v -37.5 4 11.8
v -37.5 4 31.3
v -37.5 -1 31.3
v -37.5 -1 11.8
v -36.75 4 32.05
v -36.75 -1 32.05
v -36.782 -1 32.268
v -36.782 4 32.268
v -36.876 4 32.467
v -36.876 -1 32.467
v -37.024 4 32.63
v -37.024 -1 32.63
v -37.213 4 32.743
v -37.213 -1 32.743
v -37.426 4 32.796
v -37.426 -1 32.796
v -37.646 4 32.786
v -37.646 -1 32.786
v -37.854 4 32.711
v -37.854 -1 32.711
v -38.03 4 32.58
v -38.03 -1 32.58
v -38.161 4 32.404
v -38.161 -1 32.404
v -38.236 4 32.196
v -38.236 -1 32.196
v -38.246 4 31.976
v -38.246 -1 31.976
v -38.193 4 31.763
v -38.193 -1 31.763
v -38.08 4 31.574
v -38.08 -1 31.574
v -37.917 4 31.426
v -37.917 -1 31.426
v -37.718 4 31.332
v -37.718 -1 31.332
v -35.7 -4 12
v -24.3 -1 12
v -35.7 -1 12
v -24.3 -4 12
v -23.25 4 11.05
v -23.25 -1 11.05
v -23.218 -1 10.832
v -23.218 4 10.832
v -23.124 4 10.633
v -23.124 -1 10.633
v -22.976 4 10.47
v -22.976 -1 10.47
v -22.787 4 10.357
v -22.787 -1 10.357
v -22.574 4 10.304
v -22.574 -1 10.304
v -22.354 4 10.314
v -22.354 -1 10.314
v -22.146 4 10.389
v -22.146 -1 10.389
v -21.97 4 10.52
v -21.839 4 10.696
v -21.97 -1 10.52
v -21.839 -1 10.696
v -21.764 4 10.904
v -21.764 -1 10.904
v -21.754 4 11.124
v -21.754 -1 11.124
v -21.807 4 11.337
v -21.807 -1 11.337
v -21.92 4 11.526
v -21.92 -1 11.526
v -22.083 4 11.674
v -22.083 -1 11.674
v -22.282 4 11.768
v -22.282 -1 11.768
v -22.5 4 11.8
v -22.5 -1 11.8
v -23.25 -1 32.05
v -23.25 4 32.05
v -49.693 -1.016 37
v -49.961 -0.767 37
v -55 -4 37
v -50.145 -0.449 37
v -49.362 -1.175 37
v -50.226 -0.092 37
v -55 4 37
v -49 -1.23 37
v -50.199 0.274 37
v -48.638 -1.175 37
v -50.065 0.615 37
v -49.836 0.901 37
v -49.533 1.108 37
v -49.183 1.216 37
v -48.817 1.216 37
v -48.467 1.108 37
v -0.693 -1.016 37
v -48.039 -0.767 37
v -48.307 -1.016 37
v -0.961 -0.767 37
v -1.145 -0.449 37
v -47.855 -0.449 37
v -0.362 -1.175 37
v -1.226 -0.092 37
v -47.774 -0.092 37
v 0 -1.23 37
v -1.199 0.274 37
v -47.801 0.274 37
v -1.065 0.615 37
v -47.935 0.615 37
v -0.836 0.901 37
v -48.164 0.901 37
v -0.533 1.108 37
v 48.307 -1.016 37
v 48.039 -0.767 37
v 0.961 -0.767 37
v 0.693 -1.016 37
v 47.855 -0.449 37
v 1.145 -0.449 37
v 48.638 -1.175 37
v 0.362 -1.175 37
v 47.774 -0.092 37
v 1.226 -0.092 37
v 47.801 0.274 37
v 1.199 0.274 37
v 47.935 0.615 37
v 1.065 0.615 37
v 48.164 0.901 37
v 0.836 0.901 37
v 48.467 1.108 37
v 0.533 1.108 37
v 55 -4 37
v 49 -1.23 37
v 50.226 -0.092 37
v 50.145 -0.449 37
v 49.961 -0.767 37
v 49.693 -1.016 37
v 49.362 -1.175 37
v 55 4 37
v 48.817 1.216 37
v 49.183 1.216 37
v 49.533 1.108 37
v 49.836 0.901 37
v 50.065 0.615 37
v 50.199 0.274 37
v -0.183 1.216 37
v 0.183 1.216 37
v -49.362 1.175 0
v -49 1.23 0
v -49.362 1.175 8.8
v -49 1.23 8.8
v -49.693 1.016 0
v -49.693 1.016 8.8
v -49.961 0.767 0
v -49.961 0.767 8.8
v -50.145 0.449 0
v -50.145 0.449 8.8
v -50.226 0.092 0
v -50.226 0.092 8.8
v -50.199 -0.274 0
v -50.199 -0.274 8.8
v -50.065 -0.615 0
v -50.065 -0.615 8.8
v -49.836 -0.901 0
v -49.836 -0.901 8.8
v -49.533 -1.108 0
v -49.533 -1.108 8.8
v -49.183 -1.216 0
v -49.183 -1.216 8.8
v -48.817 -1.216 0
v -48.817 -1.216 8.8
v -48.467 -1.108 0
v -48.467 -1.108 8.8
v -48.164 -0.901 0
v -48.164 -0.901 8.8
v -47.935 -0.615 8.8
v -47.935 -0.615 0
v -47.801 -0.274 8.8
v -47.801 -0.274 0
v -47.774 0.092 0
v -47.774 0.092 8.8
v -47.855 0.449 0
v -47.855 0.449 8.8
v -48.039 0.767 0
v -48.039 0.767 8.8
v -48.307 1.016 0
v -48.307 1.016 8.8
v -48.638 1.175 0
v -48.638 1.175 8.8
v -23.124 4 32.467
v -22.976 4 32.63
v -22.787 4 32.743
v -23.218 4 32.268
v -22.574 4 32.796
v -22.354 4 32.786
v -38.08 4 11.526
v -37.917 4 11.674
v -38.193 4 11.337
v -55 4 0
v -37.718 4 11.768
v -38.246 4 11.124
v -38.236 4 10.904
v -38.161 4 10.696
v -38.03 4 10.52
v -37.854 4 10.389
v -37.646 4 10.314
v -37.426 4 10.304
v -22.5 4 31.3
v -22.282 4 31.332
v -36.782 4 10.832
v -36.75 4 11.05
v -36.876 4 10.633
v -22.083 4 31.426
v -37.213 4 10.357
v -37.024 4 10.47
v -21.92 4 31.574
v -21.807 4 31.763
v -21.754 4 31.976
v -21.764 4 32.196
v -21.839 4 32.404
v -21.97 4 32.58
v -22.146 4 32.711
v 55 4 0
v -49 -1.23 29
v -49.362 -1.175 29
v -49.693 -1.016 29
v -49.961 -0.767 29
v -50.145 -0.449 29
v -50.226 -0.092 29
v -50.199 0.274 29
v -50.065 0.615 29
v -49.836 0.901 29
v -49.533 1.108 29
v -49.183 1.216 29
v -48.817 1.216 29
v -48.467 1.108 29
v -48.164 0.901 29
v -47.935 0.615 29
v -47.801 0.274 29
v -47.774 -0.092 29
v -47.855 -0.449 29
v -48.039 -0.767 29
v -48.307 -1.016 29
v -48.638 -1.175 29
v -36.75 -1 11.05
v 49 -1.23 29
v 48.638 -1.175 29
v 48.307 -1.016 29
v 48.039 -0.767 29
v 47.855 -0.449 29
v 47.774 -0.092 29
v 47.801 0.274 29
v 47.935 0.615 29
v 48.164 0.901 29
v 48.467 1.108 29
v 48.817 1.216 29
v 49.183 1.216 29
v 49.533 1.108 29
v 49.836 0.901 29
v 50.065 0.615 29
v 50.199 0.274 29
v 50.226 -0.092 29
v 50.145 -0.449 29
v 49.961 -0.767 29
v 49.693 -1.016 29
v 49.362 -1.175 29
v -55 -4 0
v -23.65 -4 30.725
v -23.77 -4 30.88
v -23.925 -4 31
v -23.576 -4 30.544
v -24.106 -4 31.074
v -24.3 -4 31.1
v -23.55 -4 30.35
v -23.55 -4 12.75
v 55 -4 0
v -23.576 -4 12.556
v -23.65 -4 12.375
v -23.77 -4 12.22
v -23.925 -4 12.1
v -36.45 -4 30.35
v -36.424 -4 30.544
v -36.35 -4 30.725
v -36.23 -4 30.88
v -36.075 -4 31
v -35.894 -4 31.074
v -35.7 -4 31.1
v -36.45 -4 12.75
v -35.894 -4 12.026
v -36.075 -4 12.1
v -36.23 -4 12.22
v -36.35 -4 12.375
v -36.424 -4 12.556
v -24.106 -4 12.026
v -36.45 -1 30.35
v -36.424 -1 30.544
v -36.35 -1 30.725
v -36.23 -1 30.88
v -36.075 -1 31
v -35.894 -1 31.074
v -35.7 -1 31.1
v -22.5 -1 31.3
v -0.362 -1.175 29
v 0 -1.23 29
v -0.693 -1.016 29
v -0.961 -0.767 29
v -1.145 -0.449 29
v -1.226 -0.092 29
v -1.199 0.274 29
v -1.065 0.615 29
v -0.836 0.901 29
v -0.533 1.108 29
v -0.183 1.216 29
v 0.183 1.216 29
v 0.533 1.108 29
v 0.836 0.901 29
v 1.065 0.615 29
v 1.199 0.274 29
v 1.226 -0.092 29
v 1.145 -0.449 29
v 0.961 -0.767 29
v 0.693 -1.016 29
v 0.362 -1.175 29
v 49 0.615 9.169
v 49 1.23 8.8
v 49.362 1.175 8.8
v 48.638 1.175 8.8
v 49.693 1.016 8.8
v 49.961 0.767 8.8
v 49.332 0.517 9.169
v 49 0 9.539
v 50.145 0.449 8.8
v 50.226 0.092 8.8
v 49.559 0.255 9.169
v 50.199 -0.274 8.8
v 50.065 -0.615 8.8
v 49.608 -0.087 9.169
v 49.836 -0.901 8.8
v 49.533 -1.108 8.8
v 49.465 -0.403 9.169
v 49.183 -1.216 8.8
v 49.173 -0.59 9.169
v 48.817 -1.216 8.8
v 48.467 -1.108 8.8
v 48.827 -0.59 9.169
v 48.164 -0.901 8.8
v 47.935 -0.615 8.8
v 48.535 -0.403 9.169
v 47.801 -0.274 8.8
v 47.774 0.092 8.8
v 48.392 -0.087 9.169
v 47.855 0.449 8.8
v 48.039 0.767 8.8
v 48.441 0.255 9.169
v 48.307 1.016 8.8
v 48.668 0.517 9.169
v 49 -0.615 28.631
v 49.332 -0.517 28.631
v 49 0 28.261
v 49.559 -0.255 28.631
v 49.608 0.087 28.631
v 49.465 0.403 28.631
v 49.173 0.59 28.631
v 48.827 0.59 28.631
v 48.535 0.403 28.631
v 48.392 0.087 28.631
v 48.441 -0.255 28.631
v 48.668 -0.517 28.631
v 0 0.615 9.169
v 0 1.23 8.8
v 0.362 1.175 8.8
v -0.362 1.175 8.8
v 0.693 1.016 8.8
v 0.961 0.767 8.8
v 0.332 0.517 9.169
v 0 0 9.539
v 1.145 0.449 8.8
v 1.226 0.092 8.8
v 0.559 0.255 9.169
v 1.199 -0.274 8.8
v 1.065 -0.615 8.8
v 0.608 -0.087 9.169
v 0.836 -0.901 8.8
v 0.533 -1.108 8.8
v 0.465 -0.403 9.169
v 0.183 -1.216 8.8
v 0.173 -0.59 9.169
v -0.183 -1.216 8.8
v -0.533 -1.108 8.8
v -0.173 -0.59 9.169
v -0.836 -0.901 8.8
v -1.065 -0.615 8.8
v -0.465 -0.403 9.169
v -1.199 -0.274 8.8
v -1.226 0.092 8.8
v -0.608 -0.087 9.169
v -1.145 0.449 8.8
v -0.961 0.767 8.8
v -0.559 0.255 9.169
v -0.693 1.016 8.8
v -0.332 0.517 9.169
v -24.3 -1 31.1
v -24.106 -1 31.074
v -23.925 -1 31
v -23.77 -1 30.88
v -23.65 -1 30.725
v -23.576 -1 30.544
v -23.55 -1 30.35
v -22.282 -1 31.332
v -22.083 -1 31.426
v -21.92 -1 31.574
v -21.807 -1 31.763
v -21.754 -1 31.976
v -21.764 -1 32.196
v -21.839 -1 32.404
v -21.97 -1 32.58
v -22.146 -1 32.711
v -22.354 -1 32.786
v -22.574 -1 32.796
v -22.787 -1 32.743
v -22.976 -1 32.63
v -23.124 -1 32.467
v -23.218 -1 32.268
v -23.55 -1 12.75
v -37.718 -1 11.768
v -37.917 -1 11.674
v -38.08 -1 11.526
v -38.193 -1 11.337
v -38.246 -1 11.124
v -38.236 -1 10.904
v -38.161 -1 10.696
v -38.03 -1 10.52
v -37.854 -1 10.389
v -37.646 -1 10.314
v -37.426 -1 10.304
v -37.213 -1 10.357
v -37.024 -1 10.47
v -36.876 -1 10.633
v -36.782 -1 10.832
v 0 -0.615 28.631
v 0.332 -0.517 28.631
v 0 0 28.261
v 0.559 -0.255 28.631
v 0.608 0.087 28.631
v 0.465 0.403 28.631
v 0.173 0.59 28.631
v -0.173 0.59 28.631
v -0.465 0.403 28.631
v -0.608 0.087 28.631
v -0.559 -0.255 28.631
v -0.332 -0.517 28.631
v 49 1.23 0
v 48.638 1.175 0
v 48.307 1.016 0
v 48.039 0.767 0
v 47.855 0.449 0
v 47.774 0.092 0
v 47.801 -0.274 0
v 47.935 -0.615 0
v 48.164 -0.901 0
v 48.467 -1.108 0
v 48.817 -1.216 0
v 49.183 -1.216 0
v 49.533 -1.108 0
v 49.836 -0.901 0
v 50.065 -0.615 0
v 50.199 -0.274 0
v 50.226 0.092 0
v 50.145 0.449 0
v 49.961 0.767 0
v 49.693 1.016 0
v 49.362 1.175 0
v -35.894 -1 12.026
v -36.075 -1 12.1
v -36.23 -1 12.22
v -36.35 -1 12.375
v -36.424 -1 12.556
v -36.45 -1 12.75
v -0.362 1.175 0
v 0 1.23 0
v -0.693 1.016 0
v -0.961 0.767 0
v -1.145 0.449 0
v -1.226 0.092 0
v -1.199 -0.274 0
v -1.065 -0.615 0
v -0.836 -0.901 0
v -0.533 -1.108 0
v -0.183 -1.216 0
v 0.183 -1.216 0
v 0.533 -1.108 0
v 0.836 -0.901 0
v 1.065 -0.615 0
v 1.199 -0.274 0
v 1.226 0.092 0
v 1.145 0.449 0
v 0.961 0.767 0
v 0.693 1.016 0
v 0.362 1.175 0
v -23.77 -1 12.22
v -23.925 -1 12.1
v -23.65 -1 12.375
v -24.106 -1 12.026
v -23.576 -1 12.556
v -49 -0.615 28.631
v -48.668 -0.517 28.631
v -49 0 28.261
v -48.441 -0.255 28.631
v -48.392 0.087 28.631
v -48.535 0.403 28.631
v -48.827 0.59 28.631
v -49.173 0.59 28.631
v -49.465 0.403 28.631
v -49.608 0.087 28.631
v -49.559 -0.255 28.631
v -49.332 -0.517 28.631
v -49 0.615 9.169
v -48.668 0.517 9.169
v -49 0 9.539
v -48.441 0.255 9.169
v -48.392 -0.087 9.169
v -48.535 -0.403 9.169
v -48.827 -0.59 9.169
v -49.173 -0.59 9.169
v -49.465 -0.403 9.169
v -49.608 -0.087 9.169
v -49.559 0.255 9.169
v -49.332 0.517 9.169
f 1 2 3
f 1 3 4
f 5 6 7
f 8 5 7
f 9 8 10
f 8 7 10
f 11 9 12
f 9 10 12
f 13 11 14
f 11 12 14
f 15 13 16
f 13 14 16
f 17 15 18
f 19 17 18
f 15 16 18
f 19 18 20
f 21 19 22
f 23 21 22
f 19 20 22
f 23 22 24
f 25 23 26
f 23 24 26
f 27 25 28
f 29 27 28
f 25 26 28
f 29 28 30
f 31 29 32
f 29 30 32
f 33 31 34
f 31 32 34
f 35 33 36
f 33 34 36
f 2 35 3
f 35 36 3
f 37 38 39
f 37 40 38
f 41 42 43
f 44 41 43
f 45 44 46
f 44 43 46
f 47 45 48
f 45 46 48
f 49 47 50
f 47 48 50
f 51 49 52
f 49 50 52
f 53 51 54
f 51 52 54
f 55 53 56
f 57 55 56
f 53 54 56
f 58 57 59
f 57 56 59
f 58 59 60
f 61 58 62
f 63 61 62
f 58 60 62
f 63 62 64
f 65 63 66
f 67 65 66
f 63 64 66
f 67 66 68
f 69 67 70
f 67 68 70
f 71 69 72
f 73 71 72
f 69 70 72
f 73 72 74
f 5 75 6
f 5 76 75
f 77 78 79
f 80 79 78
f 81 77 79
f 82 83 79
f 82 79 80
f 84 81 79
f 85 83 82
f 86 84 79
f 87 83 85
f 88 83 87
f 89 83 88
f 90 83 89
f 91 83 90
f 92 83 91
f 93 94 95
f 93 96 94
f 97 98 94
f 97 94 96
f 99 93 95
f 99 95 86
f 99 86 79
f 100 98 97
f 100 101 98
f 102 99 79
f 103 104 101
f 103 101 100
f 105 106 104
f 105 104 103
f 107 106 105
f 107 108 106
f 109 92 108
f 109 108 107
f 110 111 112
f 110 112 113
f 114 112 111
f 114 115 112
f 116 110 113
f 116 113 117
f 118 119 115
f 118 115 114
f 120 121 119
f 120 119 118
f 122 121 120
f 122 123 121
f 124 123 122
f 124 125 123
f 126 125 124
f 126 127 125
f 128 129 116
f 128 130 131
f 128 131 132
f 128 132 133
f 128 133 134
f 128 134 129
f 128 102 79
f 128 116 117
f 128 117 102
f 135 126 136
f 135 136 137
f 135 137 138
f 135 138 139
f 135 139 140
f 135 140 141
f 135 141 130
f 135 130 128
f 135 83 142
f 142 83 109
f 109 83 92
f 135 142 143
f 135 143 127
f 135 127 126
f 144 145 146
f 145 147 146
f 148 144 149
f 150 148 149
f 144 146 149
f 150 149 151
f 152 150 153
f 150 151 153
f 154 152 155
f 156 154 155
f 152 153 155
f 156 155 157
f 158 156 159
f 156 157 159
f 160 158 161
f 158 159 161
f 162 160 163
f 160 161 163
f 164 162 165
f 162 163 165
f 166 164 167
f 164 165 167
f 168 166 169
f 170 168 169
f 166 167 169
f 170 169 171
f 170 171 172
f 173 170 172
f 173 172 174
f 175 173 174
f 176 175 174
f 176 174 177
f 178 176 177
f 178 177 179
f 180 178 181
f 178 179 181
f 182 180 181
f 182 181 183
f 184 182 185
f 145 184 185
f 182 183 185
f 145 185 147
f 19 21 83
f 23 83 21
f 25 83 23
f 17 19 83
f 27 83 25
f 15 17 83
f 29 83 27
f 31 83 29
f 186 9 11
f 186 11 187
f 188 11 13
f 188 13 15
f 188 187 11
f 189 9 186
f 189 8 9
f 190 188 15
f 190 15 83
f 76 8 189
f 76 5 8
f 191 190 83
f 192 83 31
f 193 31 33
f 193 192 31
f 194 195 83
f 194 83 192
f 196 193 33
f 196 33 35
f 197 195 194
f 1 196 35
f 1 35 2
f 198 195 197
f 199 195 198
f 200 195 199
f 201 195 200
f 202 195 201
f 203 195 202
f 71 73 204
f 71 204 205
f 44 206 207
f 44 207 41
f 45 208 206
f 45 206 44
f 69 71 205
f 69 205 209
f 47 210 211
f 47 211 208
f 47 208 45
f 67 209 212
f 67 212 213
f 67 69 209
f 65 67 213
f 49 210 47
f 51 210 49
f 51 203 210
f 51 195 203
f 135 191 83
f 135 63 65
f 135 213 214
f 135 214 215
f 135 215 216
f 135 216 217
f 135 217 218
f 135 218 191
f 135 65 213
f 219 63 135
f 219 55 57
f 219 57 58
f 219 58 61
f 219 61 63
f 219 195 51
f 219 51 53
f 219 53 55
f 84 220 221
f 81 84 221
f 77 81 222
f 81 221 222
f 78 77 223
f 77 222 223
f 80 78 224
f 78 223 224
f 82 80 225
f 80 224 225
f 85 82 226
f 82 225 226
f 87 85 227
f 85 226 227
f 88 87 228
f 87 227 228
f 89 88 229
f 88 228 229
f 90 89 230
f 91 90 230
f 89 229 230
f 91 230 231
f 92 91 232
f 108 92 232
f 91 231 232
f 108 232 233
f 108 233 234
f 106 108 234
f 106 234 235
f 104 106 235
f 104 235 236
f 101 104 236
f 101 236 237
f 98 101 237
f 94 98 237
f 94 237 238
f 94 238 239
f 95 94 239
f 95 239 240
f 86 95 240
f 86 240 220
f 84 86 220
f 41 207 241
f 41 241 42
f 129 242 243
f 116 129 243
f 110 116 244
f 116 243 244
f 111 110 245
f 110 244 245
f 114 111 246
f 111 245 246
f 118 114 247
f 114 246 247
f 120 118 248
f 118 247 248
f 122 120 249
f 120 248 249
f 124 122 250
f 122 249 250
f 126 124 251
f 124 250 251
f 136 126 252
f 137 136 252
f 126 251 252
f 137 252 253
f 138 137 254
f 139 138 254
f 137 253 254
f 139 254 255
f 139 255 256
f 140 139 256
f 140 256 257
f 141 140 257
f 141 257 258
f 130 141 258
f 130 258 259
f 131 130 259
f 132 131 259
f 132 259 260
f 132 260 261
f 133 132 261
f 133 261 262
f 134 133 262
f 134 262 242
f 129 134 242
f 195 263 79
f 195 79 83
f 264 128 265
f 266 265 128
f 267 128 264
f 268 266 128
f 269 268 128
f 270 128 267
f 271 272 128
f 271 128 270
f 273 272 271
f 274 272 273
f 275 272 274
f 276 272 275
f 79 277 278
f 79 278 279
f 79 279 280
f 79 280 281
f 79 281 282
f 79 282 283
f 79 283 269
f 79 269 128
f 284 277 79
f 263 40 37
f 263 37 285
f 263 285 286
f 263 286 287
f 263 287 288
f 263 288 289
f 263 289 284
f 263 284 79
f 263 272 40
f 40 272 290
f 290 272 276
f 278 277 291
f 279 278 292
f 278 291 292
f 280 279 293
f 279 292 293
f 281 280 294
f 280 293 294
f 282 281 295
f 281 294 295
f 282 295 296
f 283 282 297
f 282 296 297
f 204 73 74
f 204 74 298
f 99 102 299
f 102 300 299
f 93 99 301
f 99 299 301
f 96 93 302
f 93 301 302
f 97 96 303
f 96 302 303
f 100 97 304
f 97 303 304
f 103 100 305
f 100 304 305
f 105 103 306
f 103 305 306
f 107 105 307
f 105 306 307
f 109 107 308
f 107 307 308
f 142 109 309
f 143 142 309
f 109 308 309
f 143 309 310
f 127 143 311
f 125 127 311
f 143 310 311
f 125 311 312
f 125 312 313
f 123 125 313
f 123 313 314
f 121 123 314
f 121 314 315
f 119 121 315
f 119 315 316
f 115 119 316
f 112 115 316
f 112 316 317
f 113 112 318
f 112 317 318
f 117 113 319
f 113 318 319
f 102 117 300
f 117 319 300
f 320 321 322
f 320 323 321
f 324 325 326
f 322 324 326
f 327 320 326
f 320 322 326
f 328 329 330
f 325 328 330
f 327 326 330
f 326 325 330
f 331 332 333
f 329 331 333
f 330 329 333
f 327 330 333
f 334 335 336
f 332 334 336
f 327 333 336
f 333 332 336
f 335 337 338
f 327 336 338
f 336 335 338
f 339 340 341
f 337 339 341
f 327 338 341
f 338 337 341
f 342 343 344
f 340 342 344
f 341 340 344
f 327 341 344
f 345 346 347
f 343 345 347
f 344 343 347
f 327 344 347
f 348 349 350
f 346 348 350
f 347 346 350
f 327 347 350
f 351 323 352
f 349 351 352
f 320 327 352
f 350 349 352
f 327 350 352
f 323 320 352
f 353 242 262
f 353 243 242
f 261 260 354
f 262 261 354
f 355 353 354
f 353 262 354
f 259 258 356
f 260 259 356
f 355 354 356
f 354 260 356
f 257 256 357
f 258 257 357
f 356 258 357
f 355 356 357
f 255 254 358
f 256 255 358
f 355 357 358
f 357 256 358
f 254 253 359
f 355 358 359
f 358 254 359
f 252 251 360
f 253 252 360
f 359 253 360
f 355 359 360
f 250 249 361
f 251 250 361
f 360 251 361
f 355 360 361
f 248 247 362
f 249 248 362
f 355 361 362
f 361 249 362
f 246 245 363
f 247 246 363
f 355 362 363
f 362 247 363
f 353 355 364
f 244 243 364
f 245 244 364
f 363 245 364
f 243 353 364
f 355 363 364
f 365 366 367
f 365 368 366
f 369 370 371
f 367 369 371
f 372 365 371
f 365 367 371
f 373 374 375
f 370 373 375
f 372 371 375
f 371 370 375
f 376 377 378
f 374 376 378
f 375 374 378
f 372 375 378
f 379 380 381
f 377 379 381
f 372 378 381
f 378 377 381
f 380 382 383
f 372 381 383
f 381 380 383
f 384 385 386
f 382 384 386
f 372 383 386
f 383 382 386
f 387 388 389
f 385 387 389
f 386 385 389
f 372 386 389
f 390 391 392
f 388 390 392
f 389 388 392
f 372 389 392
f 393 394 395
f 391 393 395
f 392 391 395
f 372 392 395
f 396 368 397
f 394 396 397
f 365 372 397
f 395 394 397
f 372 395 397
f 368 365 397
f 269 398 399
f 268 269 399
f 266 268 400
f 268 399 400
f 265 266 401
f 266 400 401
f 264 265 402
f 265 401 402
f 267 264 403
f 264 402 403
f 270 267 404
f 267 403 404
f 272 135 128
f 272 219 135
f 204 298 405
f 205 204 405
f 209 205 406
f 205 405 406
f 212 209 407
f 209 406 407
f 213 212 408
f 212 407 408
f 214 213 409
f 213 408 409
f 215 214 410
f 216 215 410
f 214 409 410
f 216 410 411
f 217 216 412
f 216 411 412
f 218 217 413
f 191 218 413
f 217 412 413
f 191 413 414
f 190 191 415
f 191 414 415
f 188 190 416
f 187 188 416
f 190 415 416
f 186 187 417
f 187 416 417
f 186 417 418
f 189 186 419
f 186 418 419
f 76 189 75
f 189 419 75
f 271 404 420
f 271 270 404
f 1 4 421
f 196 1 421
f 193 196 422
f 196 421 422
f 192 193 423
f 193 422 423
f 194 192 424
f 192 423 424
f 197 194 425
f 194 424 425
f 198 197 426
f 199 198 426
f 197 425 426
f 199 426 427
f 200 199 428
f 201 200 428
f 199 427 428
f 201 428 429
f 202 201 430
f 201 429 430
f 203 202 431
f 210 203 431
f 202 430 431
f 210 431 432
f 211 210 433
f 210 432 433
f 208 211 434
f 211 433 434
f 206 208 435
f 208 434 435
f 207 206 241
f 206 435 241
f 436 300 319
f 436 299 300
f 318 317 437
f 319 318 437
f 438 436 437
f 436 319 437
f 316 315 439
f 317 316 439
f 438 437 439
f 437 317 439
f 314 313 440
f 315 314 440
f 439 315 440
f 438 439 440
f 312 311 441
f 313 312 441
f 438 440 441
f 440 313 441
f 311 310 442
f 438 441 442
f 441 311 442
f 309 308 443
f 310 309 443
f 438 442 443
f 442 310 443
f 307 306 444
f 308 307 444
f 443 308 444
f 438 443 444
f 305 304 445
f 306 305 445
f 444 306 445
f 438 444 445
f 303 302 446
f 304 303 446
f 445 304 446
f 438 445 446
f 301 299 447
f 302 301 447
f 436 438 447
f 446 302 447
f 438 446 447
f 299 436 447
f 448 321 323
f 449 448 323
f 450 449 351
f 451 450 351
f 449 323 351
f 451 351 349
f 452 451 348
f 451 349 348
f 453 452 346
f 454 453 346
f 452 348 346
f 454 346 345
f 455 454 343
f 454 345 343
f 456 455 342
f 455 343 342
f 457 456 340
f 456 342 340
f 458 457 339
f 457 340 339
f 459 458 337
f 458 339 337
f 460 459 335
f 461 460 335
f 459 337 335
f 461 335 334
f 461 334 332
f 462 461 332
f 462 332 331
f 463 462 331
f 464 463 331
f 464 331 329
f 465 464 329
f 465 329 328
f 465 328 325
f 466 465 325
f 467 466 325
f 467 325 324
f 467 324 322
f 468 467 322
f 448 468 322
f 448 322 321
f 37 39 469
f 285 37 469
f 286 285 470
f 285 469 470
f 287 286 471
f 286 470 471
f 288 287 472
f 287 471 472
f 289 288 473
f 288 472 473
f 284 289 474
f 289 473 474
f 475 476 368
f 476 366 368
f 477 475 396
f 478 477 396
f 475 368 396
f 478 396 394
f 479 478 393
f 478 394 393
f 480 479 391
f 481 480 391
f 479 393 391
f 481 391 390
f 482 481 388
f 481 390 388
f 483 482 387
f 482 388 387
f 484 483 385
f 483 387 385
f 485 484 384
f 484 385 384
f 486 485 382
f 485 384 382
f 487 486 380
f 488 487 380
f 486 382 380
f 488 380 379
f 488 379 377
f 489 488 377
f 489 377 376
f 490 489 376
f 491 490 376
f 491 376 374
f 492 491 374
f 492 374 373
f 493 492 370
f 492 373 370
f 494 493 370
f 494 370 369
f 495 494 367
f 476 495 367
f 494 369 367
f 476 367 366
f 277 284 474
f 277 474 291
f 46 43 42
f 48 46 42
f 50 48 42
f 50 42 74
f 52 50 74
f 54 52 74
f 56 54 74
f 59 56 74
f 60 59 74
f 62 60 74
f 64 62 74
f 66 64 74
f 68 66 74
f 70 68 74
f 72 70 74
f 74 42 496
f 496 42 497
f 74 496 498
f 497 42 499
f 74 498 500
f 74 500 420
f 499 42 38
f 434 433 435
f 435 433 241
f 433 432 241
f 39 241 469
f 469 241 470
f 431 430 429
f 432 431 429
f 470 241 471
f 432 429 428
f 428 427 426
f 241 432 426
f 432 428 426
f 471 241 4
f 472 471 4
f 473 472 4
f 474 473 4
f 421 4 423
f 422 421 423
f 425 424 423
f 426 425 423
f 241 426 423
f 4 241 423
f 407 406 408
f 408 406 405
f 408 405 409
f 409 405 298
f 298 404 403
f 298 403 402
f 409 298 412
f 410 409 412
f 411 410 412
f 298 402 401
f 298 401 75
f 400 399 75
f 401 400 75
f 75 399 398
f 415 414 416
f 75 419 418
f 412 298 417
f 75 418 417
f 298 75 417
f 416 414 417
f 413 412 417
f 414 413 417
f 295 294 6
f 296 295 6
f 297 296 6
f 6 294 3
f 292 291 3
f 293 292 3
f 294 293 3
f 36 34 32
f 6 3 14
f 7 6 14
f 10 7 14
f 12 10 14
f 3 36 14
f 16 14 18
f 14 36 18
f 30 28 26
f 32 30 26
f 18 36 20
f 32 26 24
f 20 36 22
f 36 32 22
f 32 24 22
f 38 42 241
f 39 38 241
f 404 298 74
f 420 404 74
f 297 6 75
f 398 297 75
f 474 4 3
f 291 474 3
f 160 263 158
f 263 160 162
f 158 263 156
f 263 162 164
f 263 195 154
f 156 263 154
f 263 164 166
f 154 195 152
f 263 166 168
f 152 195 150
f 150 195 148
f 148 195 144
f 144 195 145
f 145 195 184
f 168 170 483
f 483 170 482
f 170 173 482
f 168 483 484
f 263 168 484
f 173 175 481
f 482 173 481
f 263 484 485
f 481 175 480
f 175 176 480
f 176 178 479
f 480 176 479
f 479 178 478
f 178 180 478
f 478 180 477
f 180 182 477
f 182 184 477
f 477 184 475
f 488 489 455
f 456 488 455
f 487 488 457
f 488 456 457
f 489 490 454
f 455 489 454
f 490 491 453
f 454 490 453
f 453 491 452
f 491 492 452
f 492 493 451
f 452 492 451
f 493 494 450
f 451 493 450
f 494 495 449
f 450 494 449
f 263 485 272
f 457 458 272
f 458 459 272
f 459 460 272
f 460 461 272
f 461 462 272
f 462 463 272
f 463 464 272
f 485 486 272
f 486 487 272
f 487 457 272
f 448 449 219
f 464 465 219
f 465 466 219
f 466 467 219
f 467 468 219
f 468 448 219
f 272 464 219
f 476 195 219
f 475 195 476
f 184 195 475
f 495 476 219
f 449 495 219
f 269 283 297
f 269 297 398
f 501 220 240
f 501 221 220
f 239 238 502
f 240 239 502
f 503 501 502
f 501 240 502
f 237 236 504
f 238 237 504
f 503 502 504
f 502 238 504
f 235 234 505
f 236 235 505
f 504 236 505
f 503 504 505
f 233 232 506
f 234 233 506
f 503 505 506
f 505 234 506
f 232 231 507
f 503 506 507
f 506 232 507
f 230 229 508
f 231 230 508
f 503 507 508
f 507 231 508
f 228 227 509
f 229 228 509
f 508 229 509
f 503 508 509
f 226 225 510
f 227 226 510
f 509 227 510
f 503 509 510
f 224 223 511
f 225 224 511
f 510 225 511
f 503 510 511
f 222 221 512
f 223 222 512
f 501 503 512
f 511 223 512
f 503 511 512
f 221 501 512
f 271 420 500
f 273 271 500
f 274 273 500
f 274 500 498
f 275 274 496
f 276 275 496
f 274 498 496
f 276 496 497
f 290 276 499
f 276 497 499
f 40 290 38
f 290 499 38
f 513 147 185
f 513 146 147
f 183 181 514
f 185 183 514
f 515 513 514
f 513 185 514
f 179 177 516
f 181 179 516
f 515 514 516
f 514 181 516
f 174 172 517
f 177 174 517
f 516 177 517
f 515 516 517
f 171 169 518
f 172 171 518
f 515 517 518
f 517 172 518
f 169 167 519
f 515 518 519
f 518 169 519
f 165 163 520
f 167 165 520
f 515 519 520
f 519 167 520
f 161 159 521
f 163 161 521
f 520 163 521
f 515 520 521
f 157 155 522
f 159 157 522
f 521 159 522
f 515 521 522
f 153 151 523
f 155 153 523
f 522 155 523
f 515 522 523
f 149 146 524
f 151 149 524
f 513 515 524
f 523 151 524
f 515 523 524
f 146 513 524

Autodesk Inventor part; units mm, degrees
ref_plane "YZ Plane" through (0, 0, 0) normal (1, 0, 0) x (0, 1, 0)
ref_plane "XZ Plane" through (0, 0, 0) normal (0, 1, 0) x (-1, 0, 0)
ref_plane "XY Plane" through (0, 0, 0) normal (0, 0, 1) x (1, 0, 0)
sketch "Sketch1" plane through (0, 0, 0) normal (0, 0, 1) x (1, 0, 0)
  line L0 (-55, 4) -> (55, 4)
  line L1 (55, 4) -> (55, -4)
  line L2 (55, -4) -> (-55, -4)
  line L3 (-55, -4) -> (-55, 4)
  line L4 (-55, 4) -> (55, -4) construction
  line L5 (55, 4) -> (-55, -4) construction
  point P0 (0, 0)
  dimension "d0" = 110
  dimension "d1" = 8
extrude "Extrusion1" add sketch "Sketch1" along normal blind 37
sketch "Sketch2" plane through (0, 0, 37) normal (0, 0, 1) x (1, 0, 0)
  line L0 (-55, 4) -> (-55, -4) projected
  line L1 (55, -4) -> (55, 4) projected
  point P0 (0, 0)
  point P1 (-49, 0)
  point P2 (0, 0)
  point P3 (49, 0)
  dimension "d4" = 6
  dimension "d5" = 6
hole "Hole1" at (-49, 0, 37) at (0, 0, 37) at (49, 0, 37) direction (0, 0, -1) diameter 2.459 depth 8 tip angle 118 thread size "M3x0.5" class "6H" standard "ISO Metric profile"
sketch "Sketch3" plane through (0, 0, 0) normal (0, 0, -1) x (-1, 0, 0)
  circle A0 centre (-49, 0) radius 1.2295 projected
  circle A1 centre (0, 0) radius 1.2295 projected
  circle A2 centre (49, 0) radius 1.2295 projected
hole "Hole2" at (49, 0, 0) at (0, 0, 0) at (-49, 0, 0) direction (0, 0, 1) diameter 2.459 depth 8.8 tip angle 118 thread size "M3x0.5" class "6H" standard "ISO Metric profile"
sketch "Sketch4" plane through (-55, -4, 0) normal (0, -1, 0) x (1, 0, 0)
  line L0 (18.55, 31.1) -> (31.45, 31.1)
  line L1 (31.45, 31.1) -> (31.45, 12)
  line L2 (31.45, 12) -> (18.55, 12)
  line L3 (18.55, 12) -> (18.55, 31.1)
  line L4 (18.55, 31.1) -> (31.45, 12) construction
  line L5 (31.45, 31.1) -> (18.55, 12) construction
  line L6 (110, 0) -> (0, 0) projected
  line L7 (0, 0) -> (0, 37) projected
  line L8 (110, 0) -> (110, 37) projected
  point P0 (55, 0)
  point P1 (25, 21.55)
  dimension "d21" = 12.9
  dimension "d22" = 19.1
  dimension "d23" = 12
  dimension "d29" = 85
extrude "Extrusion2" cut sketch "Sketch4" against normal blind 10
fillet "Fillet3" radius 0.75 4 edges at (-23.55, 0, 31.1) (-36.45, 0, 31.1) (-36.45, 0, 12) (-23.55, 0, 12)
sketch "Sketch5" plane through (-55, 4, 0) normal (0, 1, 0) x (1, 0, 0)
  line L0 (30.7, -31.1) -> (19.3, -31.1) projected
  line L1 (31.45, -12.75) -> (31.45, -30.35) projected
  line L2 (32.5, -32.05) -> (17.5, -32.05)
  line L3 (17.5, -32.05) -> (17.5, -11.05)
  line L4 (17.5, -11.05) -> (32.5, -11.05)
  line L5 (32.5, -11.05) -> (32.5, -32.05)
  line L6 (32.5, -32.05) -> (17.5, -11.05) construction
  line L7 (17.5, -32.05) -> (32.5, -11.05) construction
  point P0 (55, 0)
  point P1 (25, -21.55)
  dimension "d33" = 9.55
  dimension "d34" = 6.45
  dimension "d35" = 15
  dimension "d36" = 21
extrude "Extrusion3" cut sketch "Sketch5" against normal blind 5
sketch "Sketch6" plane through (-55, 4, 0) normal (0, 1, 0) x (1, 0, 0)
  line L0 (32.5, -32.05) -> (17.5, -32.05) projected
  line L1 (17.5, -32.05) -> (17.5, -11.05) projected
  line L2 (17.5, -11.05) -> (32.5, -11.05) projected
  point P0 (55, 0)
hole "Hole3" at (-22.5, 4, 32.05) at (-37.5, 4, 32.05) at (-37.5, 4, 11.05) at (-22.5, 4, 11.05) direction (0, -1, 0) diameter 1.5 depth 5
properties part number "side" material "Aluminum 6061"
